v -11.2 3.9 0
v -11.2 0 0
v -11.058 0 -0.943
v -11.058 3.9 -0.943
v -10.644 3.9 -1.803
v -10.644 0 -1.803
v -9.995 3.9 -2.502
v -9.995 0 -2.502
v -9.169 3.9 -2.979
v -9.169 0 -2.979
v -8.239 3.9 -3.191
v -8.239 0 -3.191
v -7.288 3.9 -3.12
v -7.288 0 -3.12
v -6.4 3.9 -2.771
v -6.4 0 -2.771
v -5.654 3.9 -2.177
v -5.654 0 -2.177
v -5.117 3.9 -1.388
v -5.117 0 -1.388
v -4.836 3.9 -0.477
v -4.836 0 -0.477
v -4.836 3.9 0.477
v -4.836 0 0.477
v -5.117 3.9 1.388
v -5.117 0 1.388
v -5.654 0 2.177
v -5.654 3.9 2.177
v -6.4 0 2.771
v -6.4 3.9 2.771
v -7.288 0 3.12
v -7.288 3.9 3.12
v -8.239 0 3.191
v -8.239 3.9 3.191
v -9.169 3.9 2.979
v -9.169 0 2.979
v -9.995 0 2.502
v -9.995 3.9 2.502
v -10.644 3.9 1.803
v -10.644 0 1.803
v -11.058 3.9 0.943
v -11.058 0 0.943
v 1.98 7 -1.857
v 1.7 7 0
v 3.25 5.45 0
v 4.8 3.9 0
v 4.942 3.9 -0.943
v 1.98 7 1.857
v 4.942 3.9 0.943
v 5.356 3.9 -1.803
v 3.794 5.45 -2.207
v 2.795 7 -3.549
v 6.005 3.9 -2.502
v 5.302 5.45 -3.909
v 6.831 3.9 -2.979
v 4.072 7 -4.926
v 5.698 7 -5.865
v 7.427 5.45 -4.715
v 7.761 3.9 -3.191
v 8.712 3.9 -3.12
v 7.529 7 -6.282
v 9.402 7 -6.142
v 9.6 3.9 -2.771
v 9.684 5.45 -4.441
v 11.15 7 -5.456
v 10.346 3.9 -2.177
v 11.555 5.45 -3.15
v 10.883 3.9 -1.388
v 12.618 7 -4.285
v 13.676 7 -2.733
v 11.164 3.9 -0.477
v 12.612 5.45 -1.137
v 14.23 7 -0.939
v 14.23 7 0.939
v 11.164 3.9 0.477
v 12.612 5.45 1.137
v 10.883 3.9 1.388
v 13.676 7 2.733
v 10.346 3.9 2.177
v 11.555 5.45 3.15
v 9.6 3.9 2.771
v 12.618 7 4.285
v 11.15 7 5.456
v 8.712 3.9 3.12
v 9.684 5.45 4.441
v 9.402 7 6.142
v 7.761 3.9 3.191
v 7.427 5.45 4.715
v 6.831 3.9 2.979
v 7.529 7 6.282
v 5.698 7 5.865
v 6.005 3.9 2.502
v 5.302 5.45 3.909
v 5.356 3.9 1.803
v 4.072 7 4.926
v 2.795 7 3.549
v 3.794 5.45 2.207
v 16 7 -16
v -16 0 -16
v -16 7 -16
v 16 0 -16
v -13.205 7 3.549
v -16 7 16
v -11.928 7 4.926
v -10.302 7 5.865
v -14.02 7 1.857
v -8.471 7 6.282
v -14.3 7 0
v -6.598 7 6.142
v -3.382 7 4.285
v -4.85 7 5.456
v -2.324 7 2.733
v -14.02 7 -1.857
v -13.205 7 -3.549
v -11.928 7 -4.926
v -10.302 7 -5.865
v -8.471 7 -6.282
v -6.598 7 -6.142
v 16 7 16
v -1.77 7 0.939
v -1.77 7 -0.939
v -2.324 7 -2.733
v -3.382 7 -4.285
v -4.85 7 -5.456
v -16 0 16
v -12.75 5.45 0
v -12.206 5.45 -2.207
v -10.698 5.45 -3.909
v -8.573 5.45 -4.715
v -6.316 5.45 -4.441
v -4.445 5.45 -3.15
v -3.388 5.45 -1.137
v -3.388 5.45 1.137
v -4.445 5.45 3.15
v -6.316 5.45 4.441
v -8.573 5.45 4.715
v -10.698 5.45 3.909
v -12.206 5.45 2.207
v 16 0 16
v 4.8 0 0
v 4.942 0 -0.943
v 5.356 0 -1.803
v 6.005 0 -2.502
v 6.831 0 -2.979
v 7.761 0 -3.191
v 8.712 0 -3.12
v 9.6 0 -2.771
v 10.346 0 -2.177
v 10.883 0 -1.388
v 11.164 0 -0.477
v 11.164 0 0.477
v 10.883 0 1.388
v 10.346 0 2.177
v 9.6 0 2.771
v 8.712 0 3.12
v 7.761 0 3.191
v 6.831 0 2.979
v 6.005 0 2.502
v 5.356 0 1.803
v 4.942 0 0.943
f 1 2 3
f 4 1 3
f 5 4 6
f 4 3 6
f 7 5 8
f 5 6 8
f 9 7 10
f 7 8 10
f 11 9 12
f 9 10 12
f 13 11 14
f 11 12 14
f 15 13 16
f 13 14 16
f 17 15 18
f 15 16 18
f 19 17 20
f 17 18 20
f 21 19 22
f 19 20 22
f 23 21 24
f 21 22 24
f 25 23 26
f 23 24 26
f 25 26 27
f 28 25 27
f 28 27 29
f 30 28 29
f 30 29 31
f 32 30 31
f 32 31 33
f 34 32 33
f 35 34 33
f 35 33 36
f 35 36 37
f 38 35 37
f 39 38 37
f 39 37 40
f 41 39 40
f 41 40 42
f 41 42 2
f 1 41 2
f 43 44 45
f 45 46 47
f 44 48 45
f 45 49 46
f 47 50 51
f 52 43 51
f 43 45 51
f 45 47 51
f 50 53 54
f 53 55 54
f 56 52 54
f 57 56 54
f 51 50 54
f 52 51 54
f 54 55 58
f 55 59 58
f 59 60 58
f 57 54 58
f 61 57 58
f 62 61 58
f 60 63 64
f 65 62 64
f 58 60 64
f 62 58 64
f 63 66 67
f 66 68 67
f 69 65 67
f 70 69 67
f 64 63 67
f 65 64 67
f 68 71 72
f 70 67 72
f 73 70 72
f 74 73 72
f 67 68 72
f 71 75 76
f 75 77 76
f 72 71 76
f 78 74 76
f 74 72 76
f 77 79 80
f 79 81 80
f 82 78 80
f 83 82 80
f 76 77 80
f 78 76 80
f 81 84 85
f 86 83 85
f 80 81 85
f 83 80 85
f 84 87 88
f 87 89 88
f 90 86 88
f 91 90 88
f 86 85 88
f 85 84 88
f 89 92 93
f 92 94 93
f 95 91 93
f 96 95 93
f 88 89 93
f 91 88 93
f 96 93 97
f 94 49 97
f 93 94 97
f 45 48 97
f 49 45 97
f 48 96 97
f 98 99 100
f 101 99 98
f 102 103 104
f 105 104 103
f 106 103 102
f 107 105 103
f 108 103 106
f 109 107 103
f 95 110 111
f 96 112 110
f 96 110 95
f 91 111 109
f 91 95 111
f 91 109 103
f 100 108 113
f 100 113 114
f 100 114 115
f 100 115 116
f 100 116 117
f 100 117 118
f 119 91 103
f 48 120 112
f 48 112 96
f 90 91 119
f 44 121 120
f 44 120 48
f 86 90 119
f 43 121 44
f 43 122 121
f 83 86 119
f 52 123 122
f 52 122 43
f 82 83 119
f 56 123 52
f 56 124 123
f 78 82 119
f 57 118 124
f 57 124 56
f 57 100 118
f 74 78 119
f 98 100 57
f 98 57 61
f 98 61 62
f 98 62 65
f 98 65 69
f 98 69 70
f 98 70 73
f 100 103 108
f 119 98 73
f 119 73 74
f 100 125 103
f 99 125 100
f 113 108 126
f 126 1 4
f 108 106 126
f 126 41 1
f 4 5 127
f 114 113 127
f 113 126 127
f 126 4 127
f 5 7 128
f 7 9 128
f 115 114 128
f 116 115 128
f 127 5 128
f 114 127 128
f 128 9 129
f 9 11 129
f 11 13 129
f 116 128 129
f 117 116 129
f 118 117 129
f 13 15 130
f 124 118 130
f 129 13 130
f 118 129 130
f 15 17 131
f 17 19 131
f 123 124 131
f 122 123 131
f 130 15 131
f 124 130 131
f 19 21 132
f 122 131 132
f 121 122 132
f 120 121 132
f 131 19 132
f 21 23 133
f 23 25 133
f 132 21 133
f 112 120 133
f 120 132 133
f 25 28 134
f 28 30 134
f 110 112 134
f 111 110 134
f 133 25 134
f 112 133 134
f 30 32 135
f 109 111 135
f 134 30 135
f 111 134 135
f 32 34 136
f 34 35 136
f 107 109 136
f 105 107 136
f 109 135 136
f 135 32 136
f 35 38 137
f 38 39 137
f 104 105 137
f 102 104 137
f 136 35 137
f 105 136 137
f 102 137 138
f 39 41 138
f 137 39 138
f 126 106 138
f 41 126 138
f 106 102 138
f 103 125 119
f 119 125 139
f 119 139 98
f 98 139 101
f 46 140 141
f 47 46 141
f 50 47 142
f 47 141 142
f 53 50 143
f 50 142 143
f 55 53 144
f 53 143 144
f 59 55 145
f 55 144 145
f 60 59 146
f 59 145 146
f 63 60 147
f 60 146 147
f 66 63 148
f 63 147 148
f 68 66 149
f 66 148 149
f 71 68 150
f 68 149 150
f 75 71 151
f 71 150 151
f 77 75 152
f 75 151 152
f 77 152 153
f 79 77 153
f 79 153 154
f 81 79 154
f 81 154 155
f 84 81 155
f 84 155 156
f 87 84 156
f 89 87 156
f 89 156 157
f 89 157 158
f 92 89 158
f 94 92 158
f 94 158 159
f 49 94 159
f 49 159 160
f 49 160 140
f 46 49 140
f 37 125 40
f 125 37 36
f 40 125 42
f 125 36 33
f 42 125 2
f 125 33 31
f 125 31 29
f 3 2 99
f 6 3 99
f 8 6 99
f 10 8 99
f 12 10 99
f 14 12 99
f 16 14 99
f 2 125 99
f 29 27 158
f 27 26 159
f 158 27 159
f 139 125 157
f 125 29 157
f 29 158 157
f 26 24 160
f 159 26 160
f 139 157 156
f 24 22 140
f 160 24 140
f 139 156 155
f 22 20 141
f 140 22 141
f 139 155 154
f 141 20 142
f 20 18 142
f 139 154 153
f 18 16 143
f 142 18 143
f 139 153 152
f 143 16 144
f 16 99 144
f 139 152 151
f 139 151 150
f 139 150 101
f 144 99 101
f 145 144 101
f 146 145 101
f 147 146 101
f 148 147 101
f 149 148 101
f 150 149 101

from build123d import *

# Parameters (mm, degrees)
SKETCH1_W           = 32
SKETCH1_H           = 32
BOSS_EXTRUDE1_DEPTH = 7
HOLE1_D             = 6.4
HOLE1_DEPTH         = 7
HOLE1_CSINK_D       = 12.6
HOLE1_CSINK_ANGLE   = 90


with BuildPart() as part:
    # Sketch1 → Boss-Extrude1 (new body)
    with BuildSketch(Plane(origin=(0, 0, 0), x_dir=(1, 0, 0), z_dir=(0, 1, 0))):
        Rectangle(SKETCH1_W, SKETCH1_H)
    extrude(amount=BOSS_EXTRUDE1_DEPTH)

    # Hole1
    with Locations(Plane(origin=(0, 7, 0), x_dir=(1, 0, 0), z_dir=(0, 1, 0))):
        with Locations((8, 0), (-8, 0)):
            CounterSinkHole(HOLE1_D / 2, HOLE1_CSINK_D / 2, depth=HOLE1_DEPTH, counter_sink_angle=HOLE1_CSINK_ANGLE)


solid = part.part
